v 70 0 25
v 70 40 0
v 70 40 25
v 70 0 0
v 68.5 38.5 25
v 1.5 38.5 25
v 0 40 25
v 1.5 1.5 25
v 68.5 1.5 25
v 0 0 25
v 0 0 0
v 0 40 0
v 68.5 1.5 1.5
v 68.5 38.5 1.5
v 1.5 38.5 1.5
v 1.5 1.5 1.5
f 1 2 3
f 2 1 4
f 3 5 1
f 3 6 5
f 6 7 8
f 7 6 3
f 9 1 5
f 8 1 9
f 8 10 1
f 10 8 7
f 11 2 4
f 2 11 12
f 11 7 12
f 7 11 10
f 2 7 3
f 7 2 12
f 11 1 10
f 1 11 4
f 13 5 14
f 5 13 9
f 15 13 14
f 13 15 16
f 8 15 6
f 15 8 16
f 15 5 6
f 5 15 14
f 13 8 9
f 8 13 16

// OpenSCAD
$fn = 32;

// ----------------------------------------------------------------------
// Open box: 1.5 mm walls
// ----------------------------------------------------------------------

// --- parameters (mm) ---
box_l = 70;               // outer length, X
box_w = 40;               // outer width, Y
box_h = 25;               // outer height, Z
wall = 1.5;               // wall thickness
floor = 1.5;              // floor thickness

difference() {
  cube([box_l, box_w, box_h]);
  translate([wall, wall, floor])
    cube([box_l - 2 * wall, box_w - 2 * wall, box_h]);
}
